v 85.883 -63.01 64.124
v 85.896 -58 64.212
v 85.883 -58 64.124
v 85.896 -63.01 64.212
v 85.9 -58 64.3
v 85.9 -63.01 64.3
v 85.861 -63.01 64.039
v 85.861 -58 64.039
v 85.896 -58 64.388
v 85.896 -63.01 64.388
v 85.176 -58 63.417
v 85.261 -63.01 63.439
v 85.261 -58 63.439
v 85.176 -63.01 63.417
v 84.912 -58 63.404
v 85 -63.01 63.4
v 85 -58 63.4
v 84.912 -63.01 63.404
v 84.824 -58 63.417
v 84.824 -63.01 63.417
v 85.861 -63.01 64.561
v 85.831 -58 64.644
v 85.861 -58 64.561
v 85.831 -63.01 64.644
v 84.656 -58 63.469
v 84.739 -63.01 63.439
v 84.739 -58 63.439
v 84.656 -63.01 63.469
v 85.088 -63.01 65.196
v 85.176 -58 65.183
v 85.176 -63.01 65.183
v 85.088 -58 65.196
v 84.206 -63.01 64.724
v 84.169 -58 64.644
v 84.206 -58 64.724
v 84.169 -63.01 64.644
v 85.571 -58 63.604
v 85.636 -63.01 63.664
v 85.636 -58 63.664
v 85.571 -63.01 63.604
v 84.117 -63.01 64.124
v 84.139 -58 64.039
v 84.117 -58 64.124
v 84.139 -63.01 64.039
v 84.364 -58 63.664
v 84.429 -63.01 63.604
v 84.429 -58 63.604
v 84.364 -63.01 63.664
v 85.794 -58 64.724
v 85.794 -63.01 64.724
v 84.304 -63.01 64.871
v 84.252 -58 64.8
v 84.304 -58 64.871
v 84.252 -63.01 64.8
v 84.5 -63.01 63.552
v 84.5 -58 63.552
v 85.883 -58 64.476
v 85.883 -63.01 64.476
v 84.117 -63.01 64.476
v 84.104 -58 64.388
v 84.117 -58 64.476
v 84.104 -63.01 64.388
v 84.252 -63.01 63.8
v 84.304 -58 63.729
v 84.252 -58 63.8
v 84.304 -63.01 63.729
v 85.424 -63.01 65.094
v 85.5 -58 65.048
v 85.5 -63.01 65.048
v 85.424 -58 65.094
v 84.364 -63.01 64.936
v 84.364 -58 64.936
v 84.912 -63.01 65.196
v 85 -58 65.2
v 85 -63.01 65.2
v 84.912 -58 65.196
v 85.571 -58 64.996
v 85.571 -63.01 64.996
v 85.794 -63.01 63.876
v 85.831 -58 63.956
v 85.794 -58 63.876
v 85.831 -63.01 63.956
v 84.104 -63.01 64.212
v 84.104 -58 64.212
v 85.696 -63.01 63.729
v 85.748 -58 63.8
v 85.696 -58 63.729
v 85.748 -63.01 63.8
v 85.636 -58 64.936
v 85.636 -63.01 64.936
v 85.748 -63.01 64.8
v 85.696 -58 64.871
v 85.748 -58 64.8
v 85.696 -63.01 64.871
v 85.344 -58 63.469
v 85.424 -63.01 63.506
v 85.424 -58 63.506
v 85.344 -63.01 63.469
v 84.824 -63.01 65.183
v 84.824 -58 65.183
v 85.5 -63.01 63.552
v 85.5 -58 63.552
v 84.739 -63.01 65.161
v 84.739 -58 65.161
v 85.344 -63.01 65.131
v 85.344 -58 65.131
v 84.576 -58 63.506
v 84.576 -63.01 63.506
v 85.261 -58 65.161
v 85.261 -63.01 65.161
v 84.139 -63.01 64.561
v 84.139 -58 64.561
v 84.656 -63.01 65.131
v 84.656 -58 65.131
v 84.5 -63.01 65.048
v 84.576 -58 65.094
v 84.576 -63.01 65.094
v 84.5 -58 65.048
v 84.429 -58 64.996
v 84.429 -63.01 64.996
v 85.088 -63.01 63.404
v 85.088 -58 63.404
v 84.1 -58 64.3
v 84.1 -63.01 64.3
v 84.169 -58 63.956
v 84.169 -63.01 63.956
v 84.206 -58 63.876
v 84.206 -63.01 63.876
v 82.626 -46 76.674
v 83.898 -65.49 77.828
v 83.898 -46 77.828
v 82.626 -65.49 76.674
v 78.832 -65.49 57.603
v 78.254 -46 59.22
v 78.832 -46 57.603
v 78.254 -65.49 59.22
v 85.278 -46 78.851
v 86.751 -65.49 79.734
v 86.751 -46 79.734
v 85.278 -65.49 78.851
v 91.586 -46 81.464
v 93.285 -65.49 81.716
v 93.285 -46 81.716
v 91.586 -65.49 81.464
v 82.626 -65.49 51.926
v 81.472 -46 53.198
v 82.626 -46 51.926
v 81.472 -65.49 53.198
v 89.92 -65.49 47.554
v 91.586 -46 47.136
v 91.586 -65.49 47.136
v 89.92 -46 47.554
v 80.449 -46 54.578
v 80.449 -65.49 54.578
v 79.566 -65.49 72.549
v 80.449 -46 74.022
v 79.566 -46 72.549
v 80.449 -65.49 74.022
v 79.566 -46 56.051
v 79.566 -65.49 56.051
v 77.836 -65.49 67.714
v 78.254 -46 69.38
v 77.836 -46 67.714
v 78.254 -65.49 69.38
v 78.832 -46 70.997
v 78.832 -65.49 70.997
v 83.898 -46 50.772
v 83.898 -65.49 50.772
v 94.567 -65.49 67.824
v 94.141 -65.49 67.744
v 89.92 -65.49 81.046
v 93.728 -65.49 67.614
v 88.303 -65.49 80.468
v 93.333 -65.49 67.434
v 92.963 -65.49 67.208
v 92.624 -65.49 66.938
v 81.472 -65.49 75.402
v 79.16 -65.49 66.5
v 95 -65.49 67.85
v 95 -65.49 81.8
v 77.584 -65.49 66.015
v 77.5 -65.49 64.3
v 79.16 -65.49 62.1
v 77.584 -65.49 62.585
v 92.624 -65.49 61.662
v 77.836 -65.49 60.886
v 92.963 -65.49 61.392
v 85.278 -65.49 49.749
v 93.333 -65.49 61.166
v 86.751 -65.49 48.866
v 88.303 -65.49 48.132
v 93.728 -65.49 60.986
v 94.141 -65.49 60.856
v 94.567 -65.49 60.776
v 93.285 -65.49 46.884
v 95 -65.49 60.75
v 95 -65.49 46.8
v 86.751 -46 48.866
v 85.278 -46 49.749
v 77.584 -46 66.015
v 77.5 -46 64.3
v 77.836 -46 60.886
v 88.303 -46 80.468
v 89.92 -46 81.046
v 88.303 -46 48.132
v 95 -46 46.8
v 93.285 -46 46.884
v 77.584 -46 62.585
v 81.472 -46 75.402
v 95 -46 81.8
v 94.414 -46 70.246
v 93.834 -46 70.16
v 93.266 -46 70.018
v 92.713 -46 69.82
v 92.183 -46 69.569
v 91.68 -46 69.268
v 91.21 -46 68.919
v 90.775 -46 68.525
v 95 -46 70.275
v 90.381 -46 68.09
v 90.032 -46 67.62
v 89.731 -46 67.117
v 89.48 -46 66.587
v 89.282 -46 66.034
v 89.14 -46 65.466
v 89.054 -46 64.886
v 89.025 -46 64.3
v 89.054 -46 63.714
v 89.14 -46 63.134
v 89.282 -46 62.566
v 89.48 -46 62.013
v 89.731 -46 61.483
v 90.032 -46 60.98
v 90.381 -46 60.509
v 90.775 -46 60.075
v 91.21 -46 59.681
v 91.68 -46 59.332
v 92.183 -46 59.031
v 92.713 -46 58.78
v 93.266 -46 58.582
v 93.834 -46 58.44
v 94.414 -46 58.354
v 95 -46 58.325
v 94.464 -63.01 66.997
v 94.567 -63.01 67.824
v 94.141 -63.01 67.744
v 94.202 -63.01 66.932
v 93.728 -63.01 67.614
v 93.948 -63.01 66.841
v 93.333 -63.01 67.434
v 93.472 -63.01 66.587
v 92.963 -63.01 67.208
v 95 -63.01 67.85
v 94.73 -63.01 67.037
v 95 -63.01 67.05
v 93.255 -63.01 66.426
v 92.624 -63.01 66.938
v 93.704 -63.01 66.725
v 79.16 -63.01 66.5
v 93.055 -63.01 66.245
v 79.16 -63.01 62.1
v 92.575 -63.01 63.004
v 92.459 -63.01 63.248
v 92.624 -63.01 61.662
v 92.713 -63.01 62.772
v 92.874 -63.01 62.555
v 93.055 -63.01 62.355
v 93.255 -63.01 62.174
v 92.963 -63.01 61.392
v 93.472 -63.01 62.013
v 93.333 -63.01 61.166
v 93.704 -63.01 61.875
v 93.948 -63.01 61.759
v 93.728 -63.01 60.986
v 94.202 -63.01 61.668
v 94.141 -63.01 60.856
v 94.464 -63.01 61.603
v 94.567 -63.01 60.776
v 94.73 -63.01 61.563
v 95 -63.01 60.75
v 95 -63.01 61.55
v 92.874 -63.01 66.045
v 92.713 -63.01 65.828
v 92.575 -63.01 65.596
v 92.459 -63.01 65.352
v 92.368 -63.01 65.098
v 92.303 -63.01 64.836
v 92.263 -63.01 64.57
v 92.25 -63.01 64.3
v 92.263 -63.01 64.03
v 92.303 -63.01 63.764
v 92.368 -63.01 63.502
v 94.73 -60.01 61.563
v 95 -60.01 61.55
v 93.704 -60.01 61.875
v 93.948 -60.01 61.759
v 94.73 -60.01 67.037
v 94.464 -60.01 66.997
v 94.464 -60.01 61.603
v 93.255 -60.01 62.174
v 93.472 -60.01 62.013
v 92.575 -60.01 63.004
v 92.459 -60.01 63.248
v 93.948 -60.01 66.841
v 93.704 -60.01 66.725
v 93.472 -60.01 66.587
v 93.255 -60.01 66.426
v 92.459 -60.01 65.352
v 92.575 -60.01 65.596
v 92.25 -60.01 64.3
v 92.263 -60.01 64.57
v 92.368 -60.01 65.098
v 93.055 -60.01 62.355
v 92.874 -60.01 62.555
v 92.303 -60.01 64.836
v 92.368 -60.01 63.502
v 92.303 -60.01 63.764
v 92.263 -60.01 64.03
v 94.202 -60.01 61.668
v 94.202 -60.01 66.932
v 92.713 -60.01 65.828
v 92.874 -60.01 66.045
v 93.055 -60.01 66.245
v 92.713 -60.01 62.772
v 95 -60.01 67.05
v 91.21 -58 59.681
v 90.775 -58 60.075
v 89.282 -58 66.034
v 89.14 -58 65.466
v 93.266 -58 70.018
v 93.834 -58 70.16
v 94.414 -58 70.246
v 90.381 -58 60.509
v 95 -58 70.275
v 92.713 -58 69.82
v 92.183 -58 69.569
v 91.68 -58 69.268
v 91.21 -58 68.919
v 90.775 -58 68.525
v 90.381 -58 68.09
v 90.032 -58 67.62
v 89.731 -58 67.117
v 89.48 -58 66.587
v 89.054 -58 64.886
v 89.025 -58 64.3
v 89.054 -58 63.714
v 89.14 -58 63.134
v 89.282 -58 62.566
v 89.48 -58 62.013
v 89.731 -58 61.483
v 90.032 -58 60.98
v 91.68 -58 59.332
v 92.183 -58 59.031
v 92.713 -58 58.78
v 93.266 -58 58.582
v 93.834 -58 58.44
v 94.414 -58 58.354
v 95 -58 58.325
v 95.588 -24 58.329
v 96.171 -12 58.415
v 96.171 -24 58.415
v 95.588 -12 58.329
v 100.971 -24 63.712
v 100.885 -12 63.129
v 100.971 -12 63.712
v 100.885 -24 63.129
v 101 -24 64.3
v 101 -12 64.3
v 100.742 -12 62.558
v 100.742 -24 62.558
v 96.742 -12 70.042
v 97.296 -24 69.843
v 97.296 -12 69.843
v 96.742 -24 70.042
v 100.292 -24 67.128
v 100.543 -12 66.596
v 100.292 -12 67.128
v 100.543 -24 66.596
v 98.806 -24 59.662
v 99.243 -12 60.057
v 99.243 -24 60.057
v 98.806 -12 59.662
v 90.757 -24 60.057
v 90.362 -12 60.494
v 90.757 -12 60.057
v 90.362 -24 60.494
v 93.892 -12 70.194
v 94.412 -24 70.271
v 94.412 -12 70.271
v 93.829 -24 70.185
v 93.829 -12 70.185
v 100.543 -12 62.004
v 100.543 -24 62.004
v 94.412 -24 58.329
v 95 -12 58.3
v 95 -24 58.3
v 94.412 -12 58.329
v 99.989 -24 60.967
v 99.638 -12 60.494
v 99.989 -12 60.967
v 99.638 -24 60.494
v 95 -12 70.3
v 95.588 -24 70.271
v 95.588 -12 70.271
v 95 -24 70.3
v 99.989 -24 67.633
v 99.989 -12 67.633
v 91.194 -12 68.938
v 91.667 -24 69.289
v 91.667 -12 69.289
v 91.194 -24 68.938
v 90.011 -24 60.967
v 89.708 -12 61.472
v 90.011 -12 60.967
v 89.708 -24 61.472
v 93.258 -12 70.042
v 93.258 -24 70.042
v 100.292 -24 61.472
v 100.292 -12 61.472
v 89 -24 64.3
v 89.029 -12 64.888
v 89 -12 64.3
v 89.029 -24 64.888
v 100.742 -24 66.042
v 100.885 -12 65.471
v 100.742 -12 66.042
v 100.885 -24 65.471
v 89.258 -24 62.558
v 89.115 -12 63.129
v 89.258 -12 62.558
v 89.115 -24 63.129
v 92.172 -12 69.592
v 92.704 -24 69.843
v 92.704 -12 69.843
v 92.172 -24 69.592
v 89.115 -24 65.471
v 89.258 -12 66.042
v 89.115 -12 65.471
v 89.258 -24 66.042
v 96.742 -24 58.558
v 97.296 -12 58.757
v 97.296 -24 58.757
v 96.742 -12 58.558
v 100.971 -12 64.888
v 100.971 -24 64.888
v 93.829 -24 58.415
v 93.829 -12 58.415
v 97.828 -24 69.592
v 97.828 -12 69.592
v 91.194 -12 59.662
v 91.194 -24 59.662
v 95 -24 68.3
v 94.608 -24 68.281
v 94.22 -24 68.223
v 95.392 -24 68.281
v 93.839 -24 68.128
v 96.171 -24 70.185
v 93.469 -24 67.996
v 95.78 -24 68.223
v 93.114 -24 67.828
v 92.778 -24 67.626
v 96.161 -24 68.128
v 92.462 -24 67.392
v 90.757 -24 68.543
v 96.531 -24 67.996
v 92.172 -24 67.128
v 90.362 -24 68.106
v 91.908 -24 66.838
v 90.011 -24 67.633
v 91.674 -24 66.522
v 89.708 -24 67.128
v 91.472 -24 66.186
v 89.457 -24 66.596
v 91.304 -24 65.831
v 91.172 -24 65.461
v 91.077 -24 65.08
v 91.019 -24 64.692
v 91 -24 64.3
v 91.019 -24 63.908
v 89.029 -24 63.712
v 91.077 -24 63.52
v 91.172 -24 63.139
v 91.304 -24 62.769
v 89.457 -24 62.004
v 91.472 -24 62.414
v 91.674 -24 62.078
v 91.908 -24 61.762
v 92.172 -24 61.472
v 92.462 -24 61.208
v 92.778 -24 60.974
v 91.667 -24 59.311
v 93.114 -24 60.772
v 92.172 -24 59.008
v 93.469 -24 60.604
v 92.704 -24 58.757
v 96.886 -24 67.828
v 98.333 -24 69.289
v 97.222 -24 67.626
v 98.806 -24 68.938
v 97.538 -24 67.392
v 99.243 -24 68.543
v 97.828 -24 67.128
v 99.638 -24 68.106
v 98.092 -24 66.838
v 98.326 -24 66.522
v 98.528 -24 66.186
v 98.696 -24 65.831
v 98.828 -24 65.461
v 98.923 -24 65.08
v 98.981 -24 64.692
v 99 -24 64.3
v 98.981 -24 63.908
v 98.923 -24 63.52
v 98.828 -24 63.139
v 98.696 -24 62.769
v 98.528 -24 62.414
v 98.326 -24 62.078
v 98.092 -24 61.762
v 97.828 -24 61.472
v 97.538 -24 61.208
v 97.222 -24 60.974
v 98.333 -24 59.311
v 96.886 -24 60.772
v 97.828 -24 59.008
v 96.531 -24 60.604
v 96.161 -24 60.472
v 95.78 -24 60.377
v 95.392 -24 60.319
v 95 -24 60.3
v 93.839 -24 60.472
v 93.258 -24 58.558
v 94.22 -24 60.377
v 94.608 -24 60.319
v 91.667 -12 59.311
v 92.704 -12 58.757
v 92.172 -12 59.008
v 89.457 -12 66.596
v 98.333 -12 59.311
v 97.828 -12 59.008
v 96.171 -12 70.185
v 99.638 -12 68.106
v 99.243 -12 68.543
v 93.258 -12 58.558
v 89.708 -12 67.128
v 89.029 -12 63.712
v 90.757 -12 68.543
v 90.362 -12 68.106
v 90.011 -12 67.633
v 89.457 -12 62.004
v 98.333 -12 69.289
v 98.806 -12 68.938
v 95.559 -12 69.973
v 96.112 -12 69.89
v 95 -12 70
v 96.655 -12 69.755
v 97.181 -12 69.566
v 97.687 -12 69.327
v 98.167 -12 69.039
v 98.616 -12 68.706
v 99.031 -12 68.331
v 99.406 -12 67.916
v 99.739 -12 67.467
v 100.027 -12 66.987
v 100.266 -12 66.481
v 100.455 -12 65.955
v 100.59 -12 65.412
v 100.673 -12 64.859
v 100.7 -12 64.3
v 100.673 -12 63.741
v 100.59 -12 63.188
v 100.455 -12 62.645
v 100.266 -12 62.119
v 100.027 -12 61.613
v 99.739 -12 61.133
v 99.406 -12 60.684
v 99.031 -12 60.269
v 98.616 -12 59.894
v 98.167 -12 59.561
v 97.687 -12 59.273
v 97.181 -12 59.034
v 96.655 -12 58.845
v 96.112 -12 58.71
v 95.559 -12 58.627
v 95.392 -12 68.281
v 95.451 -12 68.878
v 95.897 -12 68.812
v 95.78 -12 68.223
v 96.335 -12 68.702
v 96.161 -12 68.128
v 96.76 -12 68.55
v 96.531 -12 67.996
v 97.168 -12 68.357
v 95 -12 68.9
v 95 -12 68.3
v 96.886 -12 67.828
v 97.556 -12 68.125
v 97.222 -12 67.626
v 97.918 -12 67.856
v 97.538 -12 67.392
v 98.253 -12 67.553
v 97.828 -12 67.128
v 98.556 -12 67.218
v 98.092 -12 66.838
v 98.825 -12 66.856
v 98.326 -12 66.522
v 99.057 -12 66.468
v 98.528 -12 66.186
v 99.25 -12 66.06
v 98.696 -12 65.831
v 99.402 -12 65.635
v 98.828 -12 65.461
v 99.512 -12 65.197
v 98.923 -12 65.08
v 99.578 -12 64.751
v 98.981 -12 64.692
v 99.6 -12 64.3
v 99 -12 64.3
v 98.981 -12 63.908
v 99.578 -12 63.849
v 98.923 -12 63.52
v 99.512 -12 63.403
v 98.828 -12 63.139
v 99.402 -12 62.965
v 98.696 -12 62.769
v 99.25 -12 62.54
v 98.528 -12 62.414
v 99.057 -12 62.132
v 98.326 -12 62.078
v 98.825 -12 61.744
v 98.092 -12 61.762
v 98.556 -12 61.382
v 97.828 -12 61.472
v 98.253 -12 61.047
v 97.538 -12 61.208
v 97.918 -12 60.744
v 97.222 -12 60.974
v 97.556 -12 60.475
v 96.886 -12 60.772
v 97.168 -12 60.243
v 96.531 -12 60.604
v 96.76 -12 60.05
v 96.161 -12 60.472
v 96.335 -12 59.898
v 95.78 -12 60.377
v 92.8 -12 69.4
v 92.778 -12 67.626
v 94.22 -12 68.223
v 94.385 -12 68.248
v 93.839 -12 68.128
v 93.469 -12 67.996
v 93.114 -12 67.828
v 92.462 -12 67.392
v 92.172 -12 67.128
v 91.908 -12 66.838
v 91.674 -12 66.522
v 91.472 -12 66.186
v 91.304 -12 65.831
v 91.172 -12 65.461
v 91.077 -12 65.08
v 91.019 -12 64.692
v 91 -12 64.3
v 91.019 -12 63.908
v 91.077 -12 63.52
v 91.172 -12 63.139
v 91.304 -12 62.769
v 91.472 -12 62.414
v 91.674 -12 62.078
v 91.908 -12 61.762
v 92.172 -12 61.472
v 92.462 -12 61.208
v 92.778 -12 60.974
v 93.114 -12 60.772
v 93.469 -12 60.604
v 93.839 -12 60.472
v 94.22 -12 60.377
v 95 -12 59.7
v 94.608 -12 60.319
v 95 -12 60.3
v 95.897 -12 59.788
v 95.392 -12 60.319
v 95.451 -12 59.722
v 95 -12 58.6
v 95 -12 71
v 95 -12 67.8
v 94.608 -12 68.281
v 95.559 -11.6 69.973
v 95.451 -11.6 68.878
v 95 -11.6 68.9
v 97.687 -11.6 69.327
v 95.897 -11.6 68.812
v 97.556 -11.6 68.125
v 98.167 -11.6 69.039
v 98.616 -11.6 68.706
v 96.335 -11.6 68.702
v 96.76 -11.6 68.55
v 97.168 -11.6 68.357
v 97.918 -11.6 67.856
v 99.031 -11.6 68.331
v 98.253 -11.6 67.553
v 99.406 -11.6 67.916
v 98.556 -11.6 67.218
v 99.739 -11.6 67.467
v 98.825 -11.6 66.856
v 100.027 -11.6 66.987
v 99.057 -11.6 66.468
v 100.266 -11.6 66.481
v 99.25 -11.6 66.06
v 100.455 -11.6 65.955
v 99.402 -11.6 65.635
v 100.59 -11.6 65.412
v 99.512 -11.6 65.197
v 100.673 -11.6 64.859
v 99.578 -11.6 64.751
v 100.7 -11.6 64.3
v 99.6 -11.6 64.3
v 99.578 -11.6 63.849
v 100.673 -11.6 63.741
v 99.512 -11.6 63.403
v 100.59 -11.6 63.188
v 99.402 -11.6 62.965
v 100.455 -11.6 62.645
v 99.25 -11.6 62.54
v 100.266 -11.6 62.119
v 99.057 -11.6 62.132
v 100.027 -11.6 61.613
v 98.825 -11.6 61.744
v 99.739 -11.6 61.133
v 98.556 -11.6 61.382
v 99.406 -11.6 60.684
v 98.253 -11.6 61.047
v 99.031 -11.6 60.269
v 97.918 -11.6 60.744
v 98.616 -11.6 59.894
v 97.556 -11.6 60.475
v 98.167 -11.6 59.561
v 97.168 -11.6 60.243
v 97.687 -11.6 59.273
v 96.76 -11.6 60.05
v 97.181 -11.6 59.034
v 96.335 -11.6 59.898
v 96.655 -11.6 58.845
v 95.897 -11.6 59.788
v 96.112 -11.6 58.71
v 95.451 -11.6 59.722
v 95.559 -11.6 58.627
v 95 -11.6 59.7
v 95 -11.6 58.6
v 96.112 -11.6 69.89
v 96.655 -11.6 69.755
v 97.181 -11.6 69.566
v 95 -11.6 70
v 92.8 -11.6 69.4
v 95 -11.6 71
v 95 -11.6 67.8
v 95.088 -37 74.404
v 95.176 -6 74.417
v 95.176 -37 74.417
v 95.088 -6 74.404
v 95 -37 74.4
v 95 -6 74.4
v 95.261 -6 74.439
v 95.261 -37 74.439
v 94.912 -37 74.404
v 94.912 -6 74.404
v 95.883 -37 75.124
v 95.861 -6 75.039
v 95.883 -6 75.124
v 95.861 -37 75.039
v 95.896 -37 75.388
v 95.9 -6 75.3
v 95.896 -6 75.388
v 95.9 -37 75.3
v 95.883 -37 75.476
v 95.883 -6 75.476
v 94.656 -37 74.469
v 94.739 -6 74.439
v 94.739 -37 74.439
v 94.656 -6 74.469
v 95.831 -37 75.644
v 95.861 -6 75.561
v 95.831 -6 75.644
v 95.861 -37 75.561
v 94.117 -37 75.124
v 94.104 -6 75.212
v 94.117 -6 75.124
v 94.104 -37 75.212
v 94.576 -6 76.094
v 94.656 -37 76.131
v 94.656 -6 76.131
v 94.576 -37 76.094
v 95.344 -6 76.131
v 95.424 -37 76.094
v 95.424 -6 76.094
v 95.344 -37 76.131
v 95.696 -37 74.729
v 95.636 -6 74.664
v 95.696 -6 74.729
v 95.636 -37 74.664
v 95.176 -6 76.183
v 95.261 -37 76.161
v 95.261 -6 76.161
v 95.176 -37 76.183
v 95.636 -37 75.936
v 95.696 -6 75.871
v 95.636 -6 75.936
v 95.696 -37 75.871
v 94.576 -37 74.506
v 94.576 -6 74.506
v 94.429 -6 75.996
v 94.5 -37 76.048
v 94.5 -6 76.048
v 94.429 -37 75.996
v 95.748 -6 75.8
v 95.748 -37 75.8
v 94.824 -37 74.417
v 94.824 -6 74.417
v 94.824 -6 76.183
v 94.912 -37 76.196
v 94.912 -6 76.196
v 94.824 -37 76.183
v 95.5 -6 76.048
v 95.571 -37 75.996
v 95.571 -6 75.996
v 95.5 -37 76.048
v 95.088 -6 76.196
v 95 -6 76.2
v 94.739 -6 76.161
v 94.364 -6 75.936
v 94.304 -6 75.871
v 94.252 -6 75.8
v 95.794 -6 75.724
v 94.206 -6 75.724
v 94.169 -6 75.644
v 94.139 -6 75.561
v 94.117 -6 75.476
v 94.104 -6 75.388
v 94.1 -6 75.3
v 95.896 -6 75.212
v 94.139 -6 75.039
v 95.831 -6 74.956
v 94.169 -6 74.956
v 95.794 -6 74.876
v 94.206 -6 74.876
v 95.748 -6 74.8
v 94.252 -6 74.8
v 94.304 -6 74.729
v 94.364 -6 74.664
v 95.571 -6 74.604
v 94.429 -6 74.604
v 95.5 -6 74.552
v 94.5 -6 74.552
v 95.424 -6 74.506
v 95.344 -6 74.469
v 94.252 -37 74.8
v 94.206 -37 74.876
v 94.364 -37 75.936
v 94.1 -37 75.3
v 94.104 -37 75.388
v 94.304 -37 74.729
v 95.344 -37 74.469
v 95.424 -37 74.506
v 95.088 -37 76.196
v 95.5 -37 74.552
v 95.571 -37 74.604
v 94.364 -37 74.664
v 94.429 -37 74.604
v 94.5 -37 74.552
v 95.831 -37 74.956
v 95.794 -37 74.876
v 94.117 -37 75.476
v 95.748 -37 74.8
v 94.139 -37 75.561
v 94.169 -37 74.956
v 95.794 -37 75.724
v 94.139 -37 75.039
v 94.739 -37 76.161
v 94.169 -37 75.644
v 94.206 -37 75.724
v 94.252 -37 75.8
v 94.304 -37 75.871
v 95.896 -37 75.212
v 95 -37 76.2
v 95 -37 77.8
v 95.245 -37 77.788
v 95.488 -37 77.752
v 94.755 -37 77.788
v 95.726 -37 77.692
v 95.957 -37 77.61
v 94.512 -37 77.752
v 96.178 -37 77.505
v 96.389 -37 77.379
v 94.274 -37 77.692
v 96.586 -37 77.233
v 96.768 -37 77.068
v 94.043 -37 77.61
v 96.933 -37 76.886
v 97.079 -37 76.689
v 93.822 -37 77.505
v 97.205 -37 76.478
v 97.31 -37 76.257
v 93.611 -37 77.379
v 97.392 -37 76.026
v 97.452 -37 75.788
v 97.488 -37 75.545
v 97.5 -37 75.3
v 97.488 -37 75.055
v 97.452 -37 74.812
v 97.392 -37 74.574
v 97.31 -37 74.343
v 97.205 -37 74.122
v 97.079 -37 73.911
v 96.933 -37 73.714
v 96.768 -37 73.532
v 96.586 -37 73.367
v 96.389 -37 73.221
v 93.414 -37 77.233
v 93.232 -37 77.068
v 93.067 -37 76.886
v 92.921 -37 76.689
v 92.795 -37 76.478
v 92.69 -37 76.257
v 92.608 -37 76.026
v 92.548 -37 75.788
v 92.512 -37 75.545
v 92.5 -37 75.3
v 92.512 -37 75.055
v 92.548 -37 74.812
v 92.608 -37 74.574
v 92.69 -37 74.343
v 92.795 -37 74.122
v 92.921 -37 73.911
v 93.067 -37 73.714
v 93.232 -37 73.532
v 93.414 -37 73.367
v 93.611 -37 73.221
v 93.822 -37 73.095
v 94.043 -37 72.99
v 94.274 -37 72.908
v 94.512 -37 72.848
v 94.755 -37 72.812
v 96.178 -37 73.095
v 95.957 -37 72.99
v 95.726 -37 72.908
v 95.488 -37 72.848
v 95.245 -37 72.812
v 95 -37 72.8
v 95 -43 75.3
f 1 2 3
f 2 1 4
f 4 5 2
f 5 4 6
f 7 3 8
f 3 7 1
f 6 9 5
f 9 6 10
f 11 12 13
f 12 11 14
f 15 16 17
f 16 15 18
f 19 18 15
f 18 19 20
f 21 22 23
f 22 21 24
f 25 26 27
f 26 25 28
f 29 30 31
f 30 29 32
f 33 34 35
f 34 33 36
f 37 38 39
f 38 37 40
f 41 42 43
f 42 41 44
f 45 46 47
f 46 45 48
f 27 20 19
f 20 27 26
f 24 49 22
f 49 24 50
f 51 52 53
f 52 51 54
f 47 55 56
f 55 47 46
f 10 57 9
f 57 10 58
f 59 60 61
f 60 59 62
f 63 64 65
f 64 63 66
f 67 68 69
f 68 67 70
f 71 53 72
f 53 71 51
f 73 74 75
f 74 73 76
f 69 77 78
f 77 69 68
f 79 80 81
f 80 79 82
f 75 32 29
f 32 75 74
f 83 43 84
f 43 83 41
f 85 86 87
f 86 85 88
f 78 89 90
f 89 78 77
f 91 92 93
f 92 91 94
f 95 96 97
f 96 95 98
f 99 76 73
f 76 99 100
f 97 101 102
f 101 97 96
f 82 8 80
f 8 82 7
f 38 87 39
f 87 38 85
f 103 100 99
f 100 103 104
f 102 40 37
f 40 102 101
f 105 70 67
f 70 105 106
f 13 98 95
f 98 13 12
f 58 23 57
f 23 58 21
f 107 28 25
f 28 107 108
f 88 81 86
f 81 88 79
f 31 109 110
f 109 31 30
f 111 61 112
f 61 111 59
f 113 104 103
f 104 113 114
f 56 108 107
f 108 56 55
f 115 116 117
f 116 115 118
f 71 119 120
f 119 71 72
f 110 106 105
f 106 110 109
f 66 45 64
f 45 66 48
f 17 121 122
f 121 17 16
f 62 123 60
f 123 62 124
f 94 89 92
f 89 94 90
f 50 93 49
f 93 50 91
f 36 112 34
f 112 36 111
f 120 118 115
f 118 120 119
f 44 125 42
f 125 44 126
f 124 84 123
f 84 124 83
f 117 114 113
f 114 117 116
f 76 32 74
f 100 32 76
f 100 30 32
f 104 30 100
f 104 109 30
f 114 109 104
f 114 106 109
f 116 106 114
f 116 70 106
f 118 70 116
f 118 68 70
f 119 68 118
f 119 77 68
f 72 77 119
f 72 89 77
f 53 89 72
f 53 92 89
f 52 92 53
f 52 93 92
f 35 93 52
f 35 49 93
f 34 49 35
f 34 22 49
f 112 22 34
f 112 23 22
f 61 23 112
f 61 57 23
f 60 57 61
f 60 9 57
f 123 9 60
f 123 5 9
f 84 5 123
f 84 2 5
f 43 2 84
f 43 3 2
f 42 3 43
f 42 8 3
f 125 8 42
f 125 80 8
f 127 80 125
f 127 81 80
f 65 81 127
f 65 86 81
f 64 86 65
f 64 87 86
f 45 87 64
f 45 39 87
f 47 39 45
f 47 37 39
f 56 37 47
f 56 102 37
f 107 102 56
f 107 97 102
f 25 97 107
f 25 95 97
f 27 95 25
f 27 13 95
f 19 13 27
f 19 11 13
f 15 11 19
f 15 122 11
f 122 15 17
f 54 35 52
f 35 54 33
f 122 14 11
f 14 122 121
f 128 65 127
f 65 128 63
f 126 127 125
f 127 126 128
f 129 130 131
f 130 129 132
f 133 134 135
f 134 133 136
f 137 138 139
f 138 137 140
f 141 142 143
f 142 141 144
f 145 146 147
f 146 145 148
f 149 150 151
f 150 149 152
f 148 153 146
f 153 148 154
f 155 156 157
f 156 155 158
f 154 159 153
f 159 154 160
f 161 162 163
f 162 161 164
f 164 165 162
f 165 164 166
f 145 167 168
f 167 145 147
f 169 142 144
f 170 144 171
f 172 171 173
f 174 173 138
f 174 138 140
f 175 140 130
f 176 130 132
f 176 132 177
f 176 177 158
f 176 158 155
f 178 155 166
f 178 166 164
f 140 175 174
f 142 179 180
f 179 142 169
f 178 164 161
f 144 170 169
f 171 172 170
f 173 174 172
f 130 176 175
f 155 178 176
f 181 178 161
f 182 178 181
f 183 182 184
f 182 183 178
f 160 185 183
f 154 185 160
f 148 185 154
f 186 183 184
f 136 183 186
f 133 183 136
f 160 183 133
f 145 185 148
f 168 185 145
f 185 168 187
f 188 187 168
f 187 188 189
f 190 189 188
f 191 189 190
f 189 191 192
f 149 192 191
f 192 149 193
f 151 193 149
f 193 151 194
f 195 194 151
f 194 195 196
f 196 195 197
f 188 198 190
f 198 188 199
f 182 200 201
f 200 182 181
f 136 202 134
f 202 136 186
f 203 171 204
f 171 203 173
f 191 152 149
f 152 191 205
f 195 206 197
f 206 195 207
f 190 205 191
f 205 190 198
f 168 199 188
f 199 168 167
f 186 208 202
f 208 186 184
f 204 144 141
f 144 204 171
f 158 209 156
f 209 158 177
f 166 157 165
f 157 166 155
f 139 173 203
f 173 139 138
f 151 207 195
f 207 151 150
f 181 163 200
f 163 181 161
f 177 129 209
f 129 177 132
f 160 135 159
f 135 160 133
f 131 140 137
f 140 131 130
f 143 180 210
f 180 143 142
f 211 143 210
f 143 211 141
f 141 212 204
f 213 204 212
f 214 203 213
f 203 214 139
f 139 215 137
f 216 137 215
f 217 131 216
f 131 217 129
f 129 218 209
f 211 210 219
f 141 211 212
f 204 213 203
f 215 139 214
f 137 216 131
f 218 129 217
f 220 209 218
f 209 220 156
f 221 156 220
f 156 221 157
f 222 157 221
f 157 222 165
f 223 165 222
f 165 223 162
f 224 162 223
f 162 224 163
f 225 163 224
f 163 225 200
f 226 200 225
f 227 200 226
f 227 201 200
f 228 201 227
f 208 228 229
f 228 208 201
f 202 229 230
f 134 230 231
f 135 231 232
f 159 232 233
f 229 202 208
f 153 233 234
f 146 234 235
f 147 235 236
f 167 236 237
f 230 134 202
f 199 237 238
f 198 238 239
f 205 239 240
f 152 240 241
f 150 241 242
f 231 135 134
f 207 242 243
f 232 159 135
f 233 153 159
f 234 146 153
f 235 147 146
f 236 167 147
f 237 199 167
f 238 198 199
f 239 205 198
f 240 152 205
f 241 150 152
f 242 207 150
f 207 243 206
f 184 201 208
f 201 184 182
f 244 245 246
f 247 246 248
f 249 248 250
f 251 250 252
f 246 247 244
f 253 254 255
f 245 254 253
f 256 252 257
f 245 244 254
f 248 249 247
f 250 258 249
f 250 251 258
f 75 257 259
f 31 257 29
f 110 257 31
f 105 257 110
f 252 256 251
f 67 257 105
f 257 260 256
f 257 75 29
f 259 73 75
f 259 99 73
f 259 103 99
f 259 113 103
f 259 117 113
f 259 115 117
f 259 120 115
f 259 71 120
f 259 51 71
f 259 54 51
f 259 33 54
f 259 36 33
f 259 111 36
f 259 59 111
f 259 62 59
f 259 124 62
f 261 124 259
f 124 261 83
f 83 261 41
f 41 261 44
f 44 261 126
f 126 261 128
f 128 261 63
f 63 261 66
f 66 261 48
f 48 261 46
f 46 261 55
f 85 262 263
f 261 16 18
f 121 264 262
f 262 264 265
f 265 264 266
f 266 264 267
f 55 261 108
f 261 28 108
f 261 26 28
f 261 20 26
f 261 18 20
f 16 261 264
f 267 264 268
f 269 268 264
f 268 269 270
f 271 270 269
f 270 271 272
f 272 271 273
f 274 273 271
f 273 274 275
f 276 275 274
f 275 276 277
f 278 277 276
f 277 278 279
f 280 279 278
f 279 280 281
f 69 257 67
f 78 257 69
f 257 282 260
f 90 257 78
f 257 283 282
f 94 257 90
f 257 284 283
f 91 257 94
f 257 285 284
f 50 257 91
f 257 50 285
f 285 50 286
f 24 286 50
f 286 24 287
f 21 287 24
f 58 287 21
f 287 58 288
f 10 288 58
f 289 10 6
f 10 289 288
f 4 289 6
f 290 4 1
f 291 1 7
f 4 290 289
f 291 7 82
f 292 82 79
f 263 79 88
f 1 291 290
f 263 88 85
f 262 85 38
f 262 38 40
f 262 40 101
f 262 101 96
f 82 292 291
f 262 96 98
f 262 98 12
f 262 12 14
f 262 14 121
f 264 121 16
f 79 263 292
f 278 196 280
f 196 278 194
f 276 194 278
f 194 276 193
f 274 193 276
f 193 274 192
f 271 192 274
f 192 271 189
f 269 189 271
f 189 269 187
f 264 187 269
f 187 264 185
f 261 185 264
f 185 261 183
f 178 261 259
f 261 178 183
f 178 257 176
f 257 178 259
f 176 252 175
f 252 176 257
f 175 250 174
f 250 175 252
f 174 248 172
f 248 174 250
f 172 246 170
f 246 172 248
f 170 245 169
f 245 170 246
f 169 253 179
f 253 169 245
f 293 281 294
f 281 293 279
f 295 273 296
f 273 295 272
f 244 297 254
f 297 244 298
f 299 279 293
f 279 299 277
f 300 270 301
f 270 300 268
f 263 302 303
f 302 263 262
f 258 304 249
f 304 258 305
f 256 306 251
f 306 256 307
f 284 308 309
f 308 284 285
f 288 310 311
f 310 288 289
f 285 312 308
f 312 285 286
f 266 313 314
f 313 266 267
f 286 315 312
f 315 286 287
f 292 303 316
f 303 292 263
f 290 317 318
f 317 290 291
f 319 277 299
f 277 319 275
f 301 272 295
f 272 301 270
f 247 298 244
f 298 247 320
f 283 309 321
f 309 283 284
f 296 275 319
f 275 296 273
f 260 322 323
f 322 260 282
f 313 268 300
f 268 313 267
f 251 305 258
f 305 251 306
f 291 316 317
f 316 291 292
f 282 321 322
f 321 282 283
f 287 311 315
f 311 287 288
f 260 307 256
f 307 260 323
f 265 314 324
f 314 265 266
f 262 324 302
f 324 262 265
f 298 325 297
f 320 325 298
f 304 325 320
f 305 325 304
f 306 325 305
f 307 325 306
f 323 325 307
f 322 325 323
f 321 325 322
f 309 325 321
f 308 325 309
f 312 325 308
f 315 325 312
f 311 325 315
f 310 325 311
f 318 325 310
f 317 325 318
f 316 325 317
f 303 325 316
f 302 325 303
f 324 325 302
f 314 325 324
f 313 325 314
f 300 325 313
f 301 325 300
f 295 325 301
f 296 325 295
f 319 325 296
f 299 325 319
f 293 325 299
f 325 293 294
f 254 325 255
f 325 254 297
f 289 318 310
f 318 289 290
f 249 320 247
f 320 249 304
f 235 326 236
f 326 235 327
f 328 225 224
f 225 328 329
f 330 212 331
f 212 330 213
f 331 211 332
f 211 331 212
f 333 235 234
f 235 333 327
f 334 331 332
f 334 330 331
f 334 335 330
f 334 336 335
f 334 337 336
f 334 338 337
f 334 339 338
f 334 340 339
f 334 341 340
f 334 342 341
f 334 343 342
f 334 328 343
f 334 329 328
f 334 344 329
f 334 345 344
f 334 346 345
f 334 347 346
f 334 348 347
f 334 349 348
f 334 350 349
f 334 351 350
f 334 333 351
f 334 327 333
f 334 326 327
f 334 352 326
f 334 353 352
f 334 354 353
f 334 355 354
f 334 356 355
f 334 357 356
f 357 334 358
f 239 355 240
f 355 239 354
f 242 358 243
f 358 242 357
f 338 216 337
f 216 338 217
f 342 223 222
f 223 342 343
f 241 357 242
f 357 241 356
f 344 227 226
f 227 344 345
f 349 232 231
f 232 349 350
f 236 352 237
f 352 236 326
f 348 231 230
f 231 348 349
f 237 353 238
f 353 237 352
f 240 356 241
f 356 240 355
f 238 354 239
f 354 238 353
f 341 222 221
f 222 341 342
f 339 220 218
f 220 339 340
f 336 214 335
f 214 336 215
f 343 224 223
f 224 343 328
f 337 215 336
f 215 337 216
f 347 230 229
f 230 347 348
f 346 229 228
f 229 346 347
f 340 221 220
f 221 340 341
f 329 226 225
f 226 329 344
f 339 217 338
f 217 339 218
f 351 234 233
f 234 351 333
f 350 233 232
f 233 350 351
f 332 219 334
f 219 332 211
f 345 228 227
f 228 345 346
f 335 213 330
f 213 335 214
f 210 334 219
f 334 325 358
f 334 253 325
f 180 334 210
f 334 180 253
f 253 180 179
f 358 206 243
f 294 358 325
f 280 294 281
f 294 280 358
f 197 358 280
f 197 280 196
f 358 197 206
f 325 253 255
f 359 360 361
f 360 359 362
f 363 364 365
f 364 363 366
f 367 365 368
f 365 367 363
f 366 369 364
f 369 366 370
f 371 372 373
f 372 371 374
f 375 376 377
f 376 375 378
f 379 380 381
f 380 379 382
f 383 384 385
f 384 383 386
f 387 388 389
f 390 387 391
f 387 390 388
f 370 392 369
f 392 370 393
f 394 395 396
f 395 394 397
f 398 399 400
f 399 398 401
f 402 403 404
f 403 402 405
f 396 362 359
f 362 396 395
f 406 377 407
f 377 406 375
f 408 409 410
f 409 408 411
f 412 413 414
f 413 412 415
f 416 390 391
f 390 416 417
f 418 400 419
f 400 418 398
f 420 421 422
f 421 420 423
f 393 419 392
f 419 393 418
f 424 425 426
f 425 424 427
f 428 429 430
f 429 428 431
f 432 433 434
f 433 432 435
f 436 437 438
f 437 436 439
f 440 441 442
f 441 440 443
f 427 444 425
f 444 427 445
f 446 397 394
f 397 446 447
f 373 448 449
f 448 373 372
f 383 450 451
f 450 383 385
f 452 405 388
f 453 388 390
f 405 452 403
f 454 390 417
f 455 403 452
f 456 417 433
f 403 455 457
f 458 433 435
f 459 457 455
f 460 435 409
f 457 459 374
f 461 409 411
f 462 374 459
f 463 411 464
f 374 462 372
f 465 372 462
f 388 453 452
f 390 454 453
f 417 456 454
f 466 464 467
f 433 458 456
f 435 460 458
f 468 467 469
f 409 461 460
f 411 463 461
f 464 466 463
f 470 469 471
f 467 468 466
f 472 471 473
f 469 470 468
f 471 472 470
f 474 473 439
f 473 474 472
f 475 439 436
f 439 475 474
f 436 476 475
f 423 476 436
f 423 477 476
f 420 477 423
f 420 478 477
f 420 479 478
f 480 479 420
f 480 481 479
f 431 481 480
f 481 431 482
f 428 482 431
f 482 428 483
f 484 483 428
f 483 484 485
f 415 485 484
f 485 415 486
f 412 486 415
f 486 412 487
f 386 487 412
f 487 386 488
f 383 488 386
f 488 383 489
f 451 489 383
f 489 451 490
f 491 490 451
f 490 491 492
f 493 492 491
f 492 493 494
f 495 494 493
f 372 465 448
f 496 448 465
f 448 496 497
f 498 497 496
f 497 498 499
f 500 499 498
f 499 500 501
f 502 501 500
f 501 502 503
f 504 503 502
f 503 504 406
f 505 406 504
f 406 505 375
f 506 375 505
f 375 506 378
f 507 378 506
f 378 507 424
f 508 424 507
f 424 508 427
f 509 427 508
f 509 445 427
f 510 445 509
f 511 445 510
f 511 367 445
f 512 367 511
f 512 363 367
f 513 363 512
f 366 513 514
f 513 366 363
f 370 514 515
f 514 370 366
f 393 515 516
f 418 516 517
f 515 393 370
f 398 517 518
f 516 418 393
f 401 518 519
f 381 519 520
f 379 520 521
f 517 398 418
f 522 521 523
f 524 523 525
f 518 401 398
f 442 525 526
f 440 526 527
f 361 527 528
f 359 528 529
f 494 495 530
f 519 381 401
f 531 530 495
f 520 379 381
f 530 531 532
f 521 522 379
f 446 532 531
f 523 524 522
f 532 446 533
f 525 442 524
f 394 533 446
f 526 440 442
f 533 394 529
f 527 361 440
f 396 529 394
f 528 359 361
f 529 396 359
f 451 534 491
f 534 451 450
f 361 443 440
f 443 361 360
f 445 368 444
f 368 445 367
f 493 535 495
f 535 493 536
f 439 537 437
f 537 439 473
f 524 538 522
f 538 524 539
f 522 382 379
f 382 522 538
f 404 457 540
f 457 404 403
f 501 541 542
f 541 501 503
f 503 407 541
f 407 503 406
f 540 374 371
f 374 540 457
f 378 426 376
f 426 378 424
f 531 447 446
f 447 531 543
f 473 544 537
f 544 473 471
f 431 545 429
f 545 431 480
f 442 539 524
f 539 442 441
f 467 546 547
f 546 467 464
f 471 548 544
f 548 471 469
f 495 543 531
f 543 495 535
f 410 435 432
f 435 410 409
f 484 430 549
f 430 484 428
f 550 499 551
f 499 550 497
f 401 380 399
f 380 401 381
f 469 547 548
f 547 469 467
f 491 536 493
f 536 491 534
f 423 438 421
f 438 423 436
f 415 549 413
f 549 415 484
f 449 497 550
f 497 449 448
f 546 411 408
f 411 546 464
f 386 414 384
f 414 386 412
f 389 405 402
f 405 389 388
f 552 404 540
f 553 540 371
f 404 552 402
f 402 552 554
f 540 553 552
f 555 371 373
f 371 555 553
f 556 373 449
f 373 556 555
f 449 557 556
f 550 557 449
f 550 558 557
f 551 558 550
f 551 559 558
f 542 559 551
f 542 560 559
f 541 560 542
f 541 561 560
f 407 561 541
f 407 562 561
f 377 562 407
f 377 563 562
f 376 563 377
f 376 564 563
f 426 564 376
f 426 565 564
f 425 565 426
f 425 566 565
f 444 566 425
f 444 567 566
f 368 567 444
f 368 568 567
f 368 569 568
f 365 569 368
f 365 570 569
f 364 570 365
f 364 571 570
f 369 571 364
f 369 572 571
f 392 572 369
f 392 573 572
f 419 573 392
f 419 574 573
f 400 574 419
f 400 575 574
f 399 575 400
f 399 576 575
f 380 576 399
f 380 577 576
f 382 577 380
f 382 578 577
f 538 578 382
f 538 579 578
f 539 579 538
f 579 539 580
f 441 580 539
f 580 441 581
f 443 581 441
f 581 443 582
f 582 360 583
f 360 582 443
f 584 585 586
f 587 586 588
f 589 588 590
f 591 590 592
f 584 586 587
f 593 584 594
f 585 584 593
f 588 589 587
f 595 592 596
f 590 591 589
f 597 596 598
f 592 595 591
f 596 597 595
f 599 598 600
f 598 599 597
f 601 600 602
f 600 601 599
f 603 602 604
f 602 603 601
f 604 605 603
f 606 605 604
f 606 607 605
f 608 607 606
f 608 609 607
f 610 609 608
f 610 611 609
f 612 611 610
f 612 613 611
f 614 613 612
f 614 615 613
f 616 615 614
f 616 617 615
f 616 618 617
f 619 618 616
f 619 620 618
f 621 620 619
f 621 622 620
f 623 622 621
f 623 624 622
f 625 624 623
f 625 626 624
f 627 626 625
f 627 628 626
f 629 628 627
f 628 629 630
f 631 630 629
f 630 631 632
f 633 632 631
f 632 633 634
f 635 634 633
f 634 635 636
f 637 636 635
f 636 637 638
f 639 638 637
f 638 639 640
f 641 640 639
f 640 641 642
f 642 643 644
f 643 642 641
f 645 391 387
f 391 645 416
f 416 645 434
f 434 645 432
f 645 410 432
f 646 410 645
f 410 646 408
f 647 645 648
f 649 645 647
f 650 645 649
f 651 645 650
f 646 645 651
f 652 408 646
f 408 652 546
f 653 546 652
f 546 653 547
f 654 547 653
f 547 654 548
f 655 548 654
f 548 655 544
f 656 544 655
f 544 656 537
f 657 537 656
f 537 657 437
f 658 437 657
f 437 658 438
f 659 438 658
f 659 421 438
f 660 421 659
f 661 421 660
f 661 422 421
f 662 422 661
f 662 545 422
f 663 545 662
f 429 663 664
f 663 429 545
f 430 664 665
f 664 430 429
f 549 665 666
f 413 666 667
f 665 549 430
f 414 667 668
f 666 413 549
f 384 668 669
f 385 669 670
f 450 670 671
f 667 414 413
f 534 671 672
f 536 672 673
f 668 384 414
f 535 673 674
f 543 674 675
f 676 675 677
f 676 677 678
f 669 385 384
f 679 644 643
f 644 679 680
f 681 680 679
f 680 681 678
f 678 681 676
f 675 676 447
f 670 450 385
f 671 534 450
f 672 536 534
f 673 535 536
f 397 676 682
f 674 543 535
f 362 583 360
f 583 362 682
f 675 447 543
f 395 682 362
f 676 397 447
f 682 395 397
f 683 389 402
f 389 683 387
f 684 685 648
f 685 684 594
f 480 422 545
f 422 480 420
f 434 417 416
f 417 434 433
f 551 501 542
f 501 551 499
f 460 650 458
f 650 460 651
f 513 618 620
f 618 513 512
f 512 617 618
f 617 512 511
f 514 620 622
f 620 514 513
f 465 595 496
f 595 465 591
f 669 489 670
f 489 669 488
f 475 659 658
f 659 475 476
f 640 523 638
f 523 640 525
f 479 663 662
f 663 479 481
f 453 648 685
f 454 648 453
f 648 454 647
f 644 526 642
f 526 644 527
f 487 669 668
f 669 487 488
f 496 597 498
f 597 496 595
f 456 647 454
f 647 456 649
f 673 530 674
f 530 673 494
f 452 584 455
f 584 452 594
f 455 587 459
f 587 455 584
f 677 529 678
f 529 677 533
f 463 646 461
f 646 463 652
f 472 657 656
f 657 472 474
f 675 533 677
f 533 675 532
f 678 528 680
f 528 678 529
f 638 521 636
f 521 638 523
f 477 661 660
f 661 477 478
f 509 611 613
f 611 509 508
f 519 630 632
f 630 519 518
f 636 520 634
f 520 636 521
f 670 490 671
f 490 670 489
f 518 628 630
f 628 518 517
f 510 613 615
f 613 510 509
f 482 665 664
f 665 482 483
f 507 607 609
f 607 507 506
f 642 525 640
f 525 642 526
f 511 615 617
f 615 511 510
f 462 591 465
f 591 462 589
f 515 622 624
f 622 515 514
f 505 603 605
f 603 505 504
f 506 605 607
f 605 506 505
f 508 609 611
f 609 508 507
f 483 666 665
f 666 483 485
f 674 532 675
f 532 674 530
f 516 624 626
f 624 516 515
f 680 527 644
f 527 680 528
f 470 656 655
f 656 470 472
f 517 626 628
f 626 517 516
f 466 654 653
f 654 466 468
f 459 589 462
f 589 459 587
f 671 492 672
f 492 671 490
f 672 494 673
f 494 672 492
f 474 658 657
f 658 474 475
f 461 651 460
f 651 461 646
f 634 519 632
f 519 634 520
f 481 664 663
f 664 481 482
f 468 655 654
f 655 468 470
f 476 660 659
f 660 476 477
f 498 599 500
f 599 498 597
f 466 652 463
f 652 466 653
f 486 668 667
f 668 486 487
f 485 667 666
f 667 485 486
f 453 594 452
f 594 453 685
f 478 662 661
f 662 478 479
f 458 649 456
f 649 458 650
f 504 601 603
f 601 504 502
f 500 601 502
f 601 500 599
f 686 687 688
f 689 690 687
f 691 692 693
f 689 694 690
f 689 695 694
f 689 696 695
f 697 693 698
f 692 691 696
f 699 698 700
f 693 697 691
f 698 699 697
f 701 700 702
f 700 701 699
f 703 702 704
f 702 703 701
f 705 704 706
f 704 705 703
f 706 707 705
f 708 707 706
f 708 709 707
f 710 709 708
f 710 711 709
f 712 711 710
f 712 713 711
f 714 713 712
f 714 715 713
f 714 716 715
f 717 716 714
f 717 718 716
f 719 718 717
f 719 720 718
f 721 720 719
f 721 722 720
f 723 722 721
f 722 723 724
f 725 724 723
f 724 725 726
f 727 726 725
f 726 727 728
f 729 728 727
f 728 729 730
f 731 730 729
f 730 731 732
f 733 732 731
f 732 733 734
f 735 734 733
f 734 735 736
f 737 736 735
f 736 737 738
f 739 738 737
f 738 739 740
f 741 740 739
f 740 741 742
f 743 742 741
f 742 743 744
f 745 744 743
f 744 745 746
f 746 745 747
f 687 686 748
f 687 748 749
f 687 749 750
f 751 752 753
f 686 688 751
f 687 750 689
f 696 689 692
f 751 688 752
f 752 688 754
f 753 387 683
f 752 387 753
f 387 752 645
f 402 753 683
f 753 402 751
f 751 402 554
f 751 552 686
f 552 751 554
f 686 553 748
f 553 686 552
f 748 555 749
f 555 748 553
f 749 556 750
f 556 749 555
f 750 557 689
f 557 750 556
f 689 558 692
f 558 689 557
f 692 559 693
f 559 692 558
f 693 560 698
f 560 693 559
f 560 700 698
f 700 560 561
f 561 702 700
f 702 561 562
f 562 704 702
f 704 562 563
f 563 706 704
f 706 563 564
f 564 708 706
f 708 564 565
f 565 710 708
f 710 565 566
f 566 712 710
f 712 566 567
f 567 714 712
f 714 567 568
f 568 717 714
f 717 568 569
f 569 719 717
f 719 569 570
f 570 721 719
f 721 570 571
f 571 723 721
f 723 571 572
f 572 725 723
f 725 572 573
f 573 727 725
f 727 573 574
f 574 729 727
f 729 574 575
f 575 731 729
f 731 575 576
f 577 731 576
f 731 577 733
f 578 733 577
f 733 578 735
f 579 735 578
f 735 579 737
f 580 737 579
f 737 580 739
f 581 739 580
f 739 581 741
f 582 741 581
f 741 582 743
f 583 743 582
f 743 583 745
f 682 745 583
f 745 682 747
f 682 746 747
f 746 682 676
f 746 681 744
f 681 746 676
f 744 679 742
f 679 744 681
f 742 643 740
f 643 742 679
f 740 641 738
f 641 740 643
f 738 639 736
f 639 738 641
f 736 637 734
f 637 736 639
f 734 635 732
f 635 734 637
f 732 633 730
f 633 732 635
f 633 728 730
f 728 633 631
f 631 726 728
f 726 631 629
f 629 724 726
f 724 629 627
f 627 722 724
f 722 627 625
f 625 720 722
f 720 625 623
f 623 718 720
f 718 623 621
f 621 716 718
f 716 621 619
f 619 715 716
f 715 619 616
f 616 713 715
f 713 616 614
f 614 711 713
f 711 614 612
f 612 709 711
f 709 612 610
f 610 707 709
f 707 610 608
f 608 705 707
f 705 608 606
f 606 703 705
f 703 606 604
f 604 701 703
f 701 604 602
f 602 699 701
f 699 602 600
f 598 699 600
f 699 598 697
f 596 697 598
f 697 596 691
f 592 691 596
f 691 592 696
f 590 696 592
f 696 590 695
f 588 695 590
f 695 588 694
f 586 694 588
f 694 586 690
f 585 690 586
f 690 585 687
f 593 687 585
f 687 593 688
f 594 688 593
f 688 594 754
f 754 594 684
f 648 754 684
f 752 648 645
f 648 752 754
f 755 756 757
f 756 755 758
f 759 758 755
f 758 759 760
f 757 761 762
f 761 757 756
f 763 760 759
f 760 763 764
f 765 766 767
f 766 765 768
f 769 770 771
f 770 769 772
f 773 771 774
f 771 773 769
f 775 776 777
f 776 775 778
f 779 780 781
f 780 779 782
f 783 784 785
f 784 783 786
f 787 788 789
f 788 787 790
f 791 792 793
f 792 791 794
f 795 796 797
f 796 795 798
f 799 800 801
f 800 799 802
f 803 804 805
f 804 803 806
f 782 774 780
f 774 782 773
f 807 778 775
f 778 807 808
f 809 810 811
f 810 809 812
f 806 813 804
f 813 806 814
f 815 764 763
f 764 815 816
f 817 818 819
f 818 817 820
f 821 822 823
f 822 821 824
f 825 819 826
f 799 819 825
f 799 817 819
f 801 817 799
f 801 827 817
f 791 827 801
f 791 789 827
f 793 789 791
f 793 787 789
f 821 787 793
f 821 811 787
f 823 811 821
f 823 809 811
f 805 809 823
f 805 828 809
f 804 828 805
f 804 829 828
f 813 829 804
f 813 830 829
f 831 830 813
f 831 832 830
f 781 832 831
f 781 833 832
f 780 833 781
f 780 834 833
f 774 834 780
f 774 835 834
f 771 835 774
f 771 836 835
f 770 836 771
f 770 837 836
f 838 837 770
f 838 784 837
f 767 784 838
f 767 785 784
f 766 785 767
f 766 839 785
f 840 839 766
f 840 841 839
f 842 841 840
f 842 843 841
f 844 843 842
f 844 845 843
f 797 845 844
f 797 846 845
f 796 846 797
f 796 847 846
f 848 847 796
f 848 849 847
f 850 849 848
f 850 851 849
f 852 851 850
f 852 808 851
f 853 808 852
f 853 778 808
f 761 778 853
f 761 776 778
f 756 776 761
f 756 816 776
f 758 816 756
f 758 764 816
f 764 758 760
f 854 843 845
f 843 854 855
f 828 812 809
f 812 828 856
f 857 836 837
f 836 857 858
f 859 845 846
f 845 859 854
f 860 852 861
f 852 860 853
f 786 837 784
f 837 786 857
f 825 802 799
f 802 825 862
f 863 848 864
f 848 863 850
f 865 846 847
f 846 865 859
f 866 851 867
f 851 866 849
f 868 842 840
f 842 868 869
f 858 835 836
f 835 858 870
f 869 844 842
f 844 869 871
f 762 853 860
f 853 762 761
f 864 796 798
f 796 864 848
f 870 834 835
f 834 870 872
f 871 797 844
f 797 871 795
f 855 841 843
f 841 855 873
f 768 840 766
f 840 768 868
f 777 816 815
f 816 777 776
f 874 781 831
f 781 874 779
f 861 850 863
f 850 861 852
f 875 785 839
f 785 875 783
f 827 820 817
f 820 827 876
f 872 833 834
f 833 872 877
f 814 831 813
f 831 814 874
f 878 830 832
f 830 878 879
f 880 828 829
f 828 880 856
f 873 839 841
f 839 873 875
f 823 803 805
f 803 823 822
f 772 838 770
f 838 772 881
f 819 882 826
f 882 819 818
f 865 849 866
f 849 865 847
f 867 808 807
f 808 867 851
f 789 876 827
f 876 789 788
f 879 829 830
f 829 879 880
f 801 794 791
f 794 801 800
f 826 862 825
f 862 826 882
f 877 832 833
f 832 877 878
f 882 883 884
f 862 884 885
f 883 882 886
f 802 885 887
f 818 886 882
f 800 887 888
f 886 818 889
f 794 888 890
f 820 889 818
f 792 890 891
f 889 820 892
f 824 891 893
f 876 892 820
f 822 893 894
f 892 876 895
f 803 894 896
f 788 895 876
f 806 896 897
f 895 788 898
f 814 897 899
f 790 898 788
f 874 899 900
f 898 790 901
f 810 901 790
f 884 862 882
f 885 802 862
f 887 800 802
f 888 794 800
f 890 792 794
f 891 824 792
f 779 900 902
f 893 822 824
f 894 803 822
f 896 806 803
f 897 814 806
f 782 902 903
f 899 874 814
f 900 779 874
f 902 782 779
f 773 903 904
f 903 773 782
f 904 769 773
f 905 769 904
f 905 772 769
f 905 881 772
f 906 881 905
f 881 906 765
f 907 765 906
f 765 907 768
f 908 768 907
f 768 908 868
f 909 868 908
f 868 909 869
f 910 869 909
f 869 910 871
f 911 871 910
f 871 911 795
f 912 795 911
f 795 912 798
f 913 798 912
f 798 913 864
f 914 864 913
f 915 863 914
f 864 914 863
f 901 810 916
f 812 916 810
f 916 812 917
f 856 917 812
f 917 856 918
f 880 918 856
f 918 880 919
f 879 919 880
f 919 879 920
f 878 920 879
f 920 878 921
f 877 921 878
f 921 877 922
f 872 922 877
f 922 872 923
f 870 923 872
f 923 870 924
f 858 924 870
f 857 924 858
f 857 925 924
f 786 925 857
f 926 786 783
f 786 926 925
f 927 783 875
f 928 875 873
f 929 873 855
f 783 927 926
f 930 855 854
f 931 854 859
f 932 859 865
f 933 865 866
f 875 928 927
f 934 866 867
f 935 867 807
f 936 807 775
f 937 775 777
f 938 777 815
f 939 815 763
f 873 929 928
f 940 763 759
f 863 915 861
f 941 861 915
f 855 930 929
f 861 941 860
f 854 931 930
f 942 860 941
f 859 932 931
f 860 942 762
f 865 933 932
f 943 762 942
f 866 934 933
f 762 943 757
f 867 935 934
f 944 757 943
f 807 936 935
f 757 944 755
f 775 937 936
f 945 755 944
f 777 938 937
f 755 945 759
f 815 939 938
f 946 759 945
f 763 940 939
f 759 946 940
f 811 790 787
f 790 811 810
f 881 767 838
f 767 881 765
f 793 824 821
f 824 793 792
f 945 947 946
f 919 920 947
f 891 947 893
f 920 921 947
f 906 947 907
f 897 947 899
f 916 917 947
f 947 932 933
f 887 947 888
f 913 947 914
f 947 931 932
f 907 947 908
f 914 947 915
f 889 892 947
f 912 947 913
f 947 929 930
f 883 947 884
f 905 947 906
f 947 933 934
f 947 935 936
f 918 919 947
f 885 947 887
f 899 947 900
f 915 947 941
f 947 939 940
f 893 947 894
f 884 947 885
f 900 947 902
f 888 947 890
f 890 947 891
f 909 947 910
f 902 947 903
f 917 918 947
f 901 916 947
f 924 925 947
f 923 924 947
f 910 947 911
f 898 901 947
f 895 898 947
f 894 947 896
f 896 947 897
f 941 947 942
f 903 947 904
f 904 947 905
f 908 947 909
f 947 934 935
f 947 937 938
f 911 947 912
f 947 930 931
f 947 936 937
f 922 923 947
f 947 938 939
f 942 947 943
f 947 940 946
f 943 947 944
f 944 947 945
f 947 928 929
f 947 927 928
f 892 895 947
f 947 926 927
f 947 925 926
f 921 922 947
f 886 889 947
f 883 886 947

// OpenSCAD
// One driven axle (axle 3) of the card dropper, step by step: the parts of each step, exported one by one
// (`only`) for Blender to colour and render. The printed parts come from card_dropper.scad; the bought ones
// (servo, horn, bearings, rod, screws) are simple stand-ins.
include <../card_dropper.scad>
part = "none";              // card_dropper.scad draws nothing by itself
panel = 1;                  // which step
only = "";                  // which item of it ("" = all)
$fn = 64;

X = axle_x[2];              // axle 3
Z = axle_z;
spline_top = hub_y0 + horn_recess - horn_t;
housing_face = -block_half_w - housing_out;
rod_y0 = housing_face - (hub_gap + clutch_l - 0.5);   // the rod's end, inside the hub
far_608 = block_half_w + housing_out - bearing_w;     // the other wall's bearing

// an item: its name is echoed (the exporter lists them), and drawn when it is the one asked for
module it(name) { echo(str("ITEM:", name)); if (only == "" || only == name) children(); }

module along_y(y) translate([X, y, Z]) rotate([-90, 0, 0]) children();
module tube(od, id, l) difference() { cylinder(d = od, h = l); translate([0, 0, -1]) cylinder(d = id, h = l + 2); }

// --- bought parts ----------------------------------------------------------------------------
module hf0812(y) {
    it("clutch") along_y(y) tube(clutch_od, rod_d, clutch_l);
    it("clutch_arrow") along_y(y + clutch_l) linear_extrude(0.4)        // the arrow printed on its face
        union() { difference() { circle(d = 11.4); circle(d = 9.2); translate([-6, -6]) square([6, 12]); }
                  translate([0, -5.1]) polygon([[0, -1.6], [0, 1.6], [-2.2, 0]]); }
}
module b608(y, n) it(str("bearing", n)) along_y(y) tube(bearing_od, rod_d, bearing_w);
module rod(y0) it("rod") along_y(y0) cylinder(d = rod_d, h = rod_length(2));

module horn(y) it("horn") along_y(y) difference() {                 // the double arm, uncut
    a = horn_len / 2 - horn_tip_w / 2;
    union() {
        cylinder(d = horn_hub_d, h = horn_t);
        for (s = [-1, 1]) translate([s * a, 0, 0]) cylinder(d = horn_tip_w, h = horn_t);
        linear_extrude(horn_t) polygon([[-a, -horn_tip_w / 2], [0, -horn_root_w / 2], [a, -horn_tip_w / 2], [a, horn_tip_w / 2], [0, horn_root_w / 2], [-a, horn_tip_w / 2]]);
    }
    translate([0, 0, -3]) cylinder(d = 4.8, h = 10);                 // the spline's hole
    for (s = [-1, 1]) translate([s * horn_screw_r, 0, -1]) cylinder(d = 2, h = 5);   // the hole opened for a screw
}

module small_screws(y) it("screws_horn") for (s = [-1, 1])          // the horn's two small screws, going in along +y
    translate([X + s * horn_screw_r, y, Z]) rotate([-90, 0, 0]) { cylinder(d = 3.8, h = 1); cylinder(d = 2, h = 7); }

module servo(dy = 0) translate([0, dy, 0]) {        // an MG90S: tabs on the bracket's face, shaft on the axle
    y1 = servo_tab_face;
    zc = Z - servo_shaft_offset;
    it("servo") {
        translate([X - servo_body_w / 2, y1 - 18, zc - servo_body_l / 2]) cube([servo_body_w, 18 + servo_tab_t + 6, servo_body_l]);
        translate([X - servo_body_w / 2, y1, zc - 16]) cube([servo_body_w, servo_tab_t, 32]);       // the tabs
        along_y(y1 + servo_tab_t + 6) cylinder(d = 11.8, h = 2.5);                                 // the top boss
    }
    it("spline") along_y(y1 + servo_tab_t + 8.5) cylinder(d = 4.8, h = spline_top - (y1 + servo_tab_t + 8.5));
}
module m2_screws(dy) it("screws_servo") for (s = [-1, 1])
    translate([X, servo_tab_face + servo_tab_t + dy, Z - servo_shaft_offset + s * servo_hole_spacing / 2]) rotate([90, 0, 0]) {
        translate([0, 0, -1.2]) cylinder(d = 3.5, h = 1.2); cylinder(d = 2, h = 10);
    }
module m3_screws(dy) it("screws_block") for (x = [bracket_legs[1], bracket_legs[2]]) for (z = [Z - 14, Z + 14])   // the two legs beside axle 3, from inside the block
    translate([x, -block_half_w + block_wall + dy, z]) rotate([90, 0, 0]) {
        translate([0, 0, -2]) cylinder(d = 5.5, h = 2); cylinder(d = 3, h = 12);
    }

// --- printed parts, cut down to what is around axle 3 ----------------------------------------
module hub(dy = 0) it("hub") translate([0, dy, 0]) placed_hub(2);
module block_piece() it("block") intersection() { wheel_block(); translate([X - 26, -60, Z - 30]) cube([52, 120, 60]); }
module bracket_piece(dy = 0) it("bracket") translate([0, dy, 0]) intersection() { servo_bracket(); translate([X - 28, -120, Z - 40]) cube([56, 120, 80]); }
module wheels() { it("wheels") for (s = [-1, 1]) placed_wheel(2, s); it("rings") for (s = [-1, 1]) placed_ring(2, s); }

module arrow(from, to, n = 1) it(str("arrow", n)) {               // what moves where
    v = to - from; l = norm(v);
    translate(from) rotate([0, acos(v[2] / l), atan2(v[1], v[0])]) {
        cylinder(d = 1.8, h = l - 6);
        translate([0, 0, l - 6]) cylinder(d1 = 5, d2 = 0, h = 6);
    }
}
function at_axle(y, dx = 0, dz = 0) = [X + dx, y, Z + dz];
module cut() translate([X, -200, Z - 100]) cube([100, 400, 200]);   // takes away the half x > X, to see inside

// --- the steps -------------------------------------------------------------------------------
if (panel == 1) {               // the one-way bearing into the hub (the hub cut in half), arrow facing out
    difference() { hub(); cut(); }
    hf0812(hub_y1 + 22);
    arrow(at_axle(hub_y1 + 40, 0, 11), at_axle(hub_y1 + 3, 0, 11));
}
if (panel == 2) {               // the horn, trimmed, into the hub's pocket; two small screws
    hub();
    horn(spline_top - 14);
    small_screws(spline_top - 28);
    arrow(at_axle(spline_top - 44, 0, 10), at_axle(spline_top - 4, 0, 10));
}
if (panel == 3) {               // the 608s into the housings, the rod through, the wheels on it inside
    block_piece();
    b608(housing_face, 1);       // already pressed in, from outside
    b608(far_608, 2);
    rod(rod_y0 - 70);
    wheels();
    arrow(at_axle(rod_y0 - 75, 0, 14), at_axle(rod_y0 - 25, 0, 14));
}
if (panel == 4) {               // the servo through the bracket, its tabs on the bracket's face, two screws
    bracket_piece();
    servo(30);                   // from inside the bracket: the body goes out through the window, the tabs stay
    m2_screws(55);
    arrow(at_axle(servo_tab_face + 50, 0, 26), at_axle(servo_tab_face + 8, 0, 26));
}
if (panel == 5) {               // the hub (horn in it) onto the rod's end, BEFORE the bracket
    block_piece(); b608(housing_face, 1); b608(far_608, 2); rod(rod_y0); wheels();
    hub(-30); horn(spline_top - 30);
    arrow(at_axle(hub_y0 - 42, 0, 21), at_axle(hub_y0 - 6, 0, 21));
}
if (panel == 6) {               // the bracket with its servo: the spline into the horn, then M3 screws from inside
    block_piece(); b608(housing_face, 1); b608(far_608, 2); rod(rod_y0); wheels();
    hub(); horn(spline_top);
    bracket_piece(-26); servo(-26);
    m3_screws(14);
    arrow(at_axle(servo_tab_face - 66, 0, 30), at_axle(servo_tab_face - 30, 0, 30));
}
if (panel == 7) difference() {  // done, cut along the axle
    union() {
        block_piece(); b608(housing_face, 1); b608(far_608, 2); rod(rod_y0); wheels();
        hub(); horn(spline_top); hf0812(hub_y1 - clutch_l);
        bracket_piece(); servo();
    }
    cut();
}
